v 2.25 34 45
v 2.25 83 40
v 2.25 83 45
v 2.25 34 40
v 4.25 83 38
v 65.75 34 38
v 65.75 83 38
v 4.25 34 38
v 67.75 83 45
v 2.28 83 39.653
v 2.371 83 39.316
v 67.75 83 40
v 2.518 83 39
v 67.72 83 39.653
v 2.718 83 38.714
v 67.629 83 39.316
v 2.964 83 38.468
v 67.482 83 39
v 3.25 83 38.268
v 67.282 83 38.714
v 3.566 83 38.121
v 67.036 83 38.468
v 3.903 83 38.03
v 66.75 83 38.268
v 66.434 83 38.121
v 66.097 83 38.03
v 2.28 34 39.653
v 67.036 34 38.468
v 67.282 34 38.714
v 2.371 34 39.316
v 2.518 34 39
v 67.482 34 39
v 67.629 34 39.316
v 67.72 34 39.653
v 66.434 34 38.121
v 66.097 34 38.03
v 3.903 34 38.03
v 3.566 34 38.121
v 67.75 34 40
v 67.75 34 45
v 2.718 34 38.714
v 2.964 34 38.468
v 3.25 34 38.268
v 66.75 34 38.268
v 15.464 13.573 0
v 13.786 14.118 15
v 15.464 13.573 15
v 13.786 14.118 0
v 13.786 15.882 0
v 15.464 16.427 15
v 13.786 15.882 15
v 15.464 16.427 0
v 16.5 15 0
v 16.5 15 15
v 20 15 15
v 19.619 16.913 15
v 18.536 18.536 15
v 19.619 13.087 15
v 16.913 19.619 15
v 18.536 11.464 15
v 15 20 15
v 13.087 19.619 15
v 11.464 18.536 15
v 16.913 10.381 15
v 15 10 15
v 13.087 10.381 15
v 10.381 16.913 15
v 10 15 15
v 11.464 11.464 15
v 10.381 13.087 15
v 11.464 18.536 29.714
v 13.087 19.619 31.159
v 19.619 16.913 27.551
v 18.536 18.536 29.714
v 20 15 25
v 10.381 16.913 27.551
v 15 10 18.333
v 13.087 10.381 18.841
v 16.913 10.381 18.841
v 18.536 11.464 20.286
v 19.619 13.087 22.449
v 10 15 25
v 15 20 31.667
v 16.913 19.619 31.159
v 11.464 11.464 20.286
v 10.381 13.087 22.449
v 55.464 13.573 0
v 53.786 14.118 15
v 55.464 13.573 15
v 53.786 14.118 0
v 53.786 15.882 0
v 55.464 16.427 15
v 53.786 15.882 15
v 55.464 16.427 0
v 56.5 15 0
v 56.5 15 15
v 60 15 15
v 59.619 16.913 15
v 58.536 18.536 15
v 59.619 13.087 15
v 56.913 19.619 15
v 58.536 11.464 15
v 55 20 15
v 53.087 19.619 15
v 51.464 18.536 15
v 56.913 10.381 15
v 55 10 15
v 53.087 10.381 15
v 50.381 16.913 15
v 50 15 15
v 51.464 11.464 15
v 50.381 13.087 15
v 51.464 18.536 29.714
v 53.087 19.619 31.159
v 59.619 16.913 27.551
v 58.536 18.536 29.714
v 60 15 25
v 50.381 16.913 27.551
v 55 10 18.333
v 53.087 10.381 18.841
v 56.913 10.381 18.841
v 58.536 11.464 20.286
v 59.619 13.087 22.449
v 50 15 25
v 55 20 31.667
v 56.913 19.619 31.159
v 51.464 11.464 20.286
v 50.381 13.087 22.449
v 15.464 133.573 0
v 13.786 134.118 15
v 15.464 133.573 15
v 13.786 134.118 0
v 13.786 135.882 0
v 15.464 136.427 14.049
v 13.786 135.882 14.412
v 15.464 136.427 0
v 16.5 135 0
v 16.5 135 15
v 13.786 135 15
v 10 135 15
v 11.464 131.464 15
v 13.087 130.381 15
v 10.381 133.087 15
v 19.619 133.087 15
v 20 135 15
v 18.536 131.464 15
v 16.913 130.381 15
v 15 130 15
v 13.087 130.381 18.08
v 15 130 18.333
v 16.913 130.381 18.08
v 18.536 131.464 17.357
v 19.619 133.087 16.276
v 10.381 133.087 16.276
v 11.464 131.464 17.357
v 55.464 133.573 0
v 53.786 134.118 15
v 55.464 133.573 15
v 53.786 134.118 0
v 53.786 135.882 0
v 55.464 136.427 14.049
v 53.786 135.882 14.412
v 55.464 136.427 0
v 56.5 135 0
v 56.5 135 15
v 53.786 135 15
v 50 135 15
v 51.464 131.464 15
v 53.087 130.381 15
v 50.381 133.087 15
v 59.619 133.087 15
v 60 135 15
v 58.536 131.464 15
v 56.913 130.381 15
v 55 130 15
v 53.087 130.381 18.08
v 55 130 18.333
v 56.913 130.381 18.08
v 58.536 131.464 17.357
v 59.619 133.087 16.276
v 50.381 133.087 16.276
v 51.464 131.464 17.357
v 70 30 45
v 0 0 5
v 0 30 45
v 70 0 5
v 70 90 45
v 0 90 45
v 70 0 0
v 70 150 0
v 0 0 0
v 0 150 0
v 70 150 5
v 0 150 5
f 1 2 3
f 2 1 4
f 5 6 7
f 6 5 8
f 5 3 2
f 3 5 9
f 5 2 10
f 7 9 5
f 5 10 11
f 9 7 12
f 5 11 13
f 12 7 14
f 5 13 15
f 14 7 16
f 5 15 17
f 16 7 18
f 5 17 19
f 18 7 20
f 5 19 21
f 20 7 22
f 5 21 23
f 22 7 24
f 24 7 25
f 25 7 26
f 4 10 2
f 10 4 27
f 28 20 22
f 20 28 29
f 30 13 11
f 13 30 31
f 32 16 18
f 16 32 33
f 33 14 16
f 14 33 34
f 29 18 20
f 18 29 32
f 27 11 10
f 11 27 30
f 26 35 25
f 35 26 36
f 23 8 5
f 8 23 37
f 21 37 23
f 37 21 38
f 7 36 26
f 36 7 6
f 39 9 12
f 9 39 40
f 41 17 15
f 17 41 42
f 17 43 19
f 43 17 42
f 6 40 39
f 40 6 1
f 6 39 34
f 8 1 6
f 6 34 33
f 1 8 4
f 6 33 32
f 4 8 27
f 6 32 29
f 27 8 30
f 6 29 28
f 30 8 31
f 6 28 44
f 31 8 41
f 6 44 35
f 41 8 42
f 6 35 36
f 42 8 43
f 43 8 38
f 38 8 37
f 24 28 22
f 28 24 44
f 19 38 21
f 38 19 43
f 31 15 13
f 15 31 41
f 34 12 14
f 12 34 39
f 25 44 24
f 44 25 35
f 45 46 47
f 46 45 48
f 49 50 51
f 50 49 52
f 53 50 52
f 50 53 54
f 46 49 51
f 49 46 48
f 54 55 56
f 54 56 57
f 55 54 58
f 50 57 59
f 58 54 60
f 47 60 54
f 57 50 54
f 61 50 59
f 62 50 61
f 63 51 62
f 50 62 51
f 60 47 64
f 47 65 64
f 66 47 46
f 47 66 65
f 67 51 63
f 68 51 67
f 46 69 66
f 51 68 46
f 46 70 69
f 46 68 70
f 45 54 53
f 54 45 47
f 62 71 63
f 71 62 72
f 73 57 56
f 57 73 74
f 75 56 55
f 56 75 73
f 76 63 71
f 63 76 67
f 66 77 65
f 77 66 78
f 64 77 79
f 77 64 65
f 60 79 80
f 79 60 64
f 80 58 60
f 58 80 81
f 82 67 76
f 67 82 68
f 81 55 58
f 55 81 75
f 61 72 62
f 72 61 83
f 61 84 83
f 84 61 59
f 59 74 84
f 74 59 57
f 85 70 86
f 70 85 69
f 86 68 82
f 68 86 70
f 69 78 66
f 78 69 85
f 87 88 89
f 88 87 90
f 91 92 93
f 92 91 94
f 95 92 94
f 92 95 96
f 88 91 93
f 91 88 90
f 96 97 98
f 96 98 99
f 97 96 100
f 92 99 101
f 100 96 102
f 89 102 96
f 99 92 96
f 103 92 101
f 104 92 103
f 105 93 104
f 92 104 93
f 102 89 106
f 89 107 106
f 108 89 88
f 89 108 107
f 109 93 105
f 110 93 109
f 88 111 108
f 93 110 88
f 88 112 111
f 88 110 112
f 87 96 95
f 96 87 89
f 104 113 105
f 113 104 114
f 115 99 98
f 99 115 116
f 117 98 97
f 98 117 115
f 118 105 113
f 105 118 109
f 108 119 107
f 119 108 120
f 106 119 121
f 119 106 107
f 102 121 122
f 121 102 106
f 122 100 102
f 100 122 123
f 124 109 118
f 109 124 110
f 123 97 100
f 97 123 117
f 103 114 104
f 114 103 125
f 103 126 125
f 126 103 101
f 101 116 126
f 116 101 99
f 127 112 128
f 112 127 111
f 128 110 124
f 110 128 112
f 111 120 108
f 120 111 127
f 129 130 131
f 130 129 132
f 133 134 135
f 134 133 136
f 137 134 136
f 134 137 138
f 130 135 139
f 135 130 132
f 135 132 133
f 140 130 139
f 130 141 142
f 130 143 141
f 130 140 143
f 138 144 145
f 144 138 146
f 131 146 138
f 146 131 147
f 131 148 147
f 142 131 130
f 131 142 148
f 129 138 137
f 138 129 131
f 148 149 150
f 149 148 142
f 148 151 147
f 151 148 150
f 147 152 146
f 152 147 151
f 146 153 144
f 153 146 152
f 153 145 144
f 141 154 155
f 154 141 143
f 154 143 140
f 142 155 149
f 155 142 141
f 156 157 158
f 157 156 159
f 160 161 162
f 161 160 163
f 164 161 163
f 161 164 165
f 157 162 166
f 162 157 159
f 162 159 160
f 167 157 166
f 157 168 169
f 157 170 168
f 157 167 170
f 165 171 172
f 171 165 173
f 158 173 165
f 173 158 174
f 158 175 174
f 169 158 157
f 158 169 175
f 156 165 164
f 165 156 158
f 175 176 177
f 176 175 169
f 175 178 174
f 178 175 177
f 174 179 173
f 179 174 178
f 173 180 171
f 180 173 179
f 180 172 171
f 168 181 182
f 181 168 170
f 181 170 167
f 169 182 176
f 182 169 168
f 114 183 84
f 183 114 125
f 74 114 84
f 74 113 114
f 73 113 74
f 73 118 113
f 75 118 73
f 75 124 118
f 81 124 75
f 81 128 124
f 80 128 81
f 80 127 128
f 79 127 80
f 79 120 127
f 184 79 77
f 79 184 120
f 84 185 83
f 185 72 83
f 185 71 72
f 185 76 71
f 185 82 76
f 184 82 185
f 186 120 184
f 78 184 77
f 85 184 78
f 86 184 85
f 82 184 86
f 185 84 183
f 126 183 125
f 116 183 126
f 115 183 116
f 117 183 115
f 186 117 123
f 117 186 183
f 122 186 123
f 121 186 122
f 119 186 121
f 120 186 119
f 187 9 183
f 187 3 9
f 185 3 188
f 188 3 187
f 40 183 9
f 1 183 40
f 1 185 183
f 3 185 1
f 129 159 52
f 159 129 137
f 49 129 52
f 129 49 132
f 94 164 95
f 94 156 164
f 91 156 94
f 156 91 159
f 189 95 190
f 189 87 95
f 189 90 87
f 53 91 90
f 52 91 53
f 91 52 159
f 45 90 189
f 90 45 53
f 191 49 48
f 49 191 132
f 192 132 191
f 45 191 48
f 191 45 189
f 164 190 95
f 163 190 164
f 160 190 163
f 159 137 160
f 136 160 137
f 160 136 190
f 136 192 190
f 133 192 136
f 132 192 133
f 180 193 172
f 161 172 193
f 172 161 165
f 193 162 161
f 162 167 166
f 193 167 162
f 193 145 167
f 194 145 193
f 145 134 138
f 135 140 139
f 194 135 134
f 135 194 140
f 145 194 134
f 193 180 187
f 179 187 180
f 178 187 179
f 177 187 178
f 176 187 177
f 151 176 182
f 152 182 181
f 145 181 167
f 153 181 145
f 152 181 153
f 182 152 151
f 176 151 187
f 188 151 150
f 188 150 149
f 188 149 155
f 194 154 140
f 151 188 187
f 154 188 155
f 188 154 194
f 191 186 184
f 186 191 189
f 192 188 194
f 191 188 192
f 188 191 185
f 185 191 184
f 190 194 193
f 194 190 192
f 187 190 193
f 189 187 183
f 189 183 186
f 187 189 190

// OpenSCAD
fn=36;

block_w = 70;
block_l = 150;
block_top_l = 60;
block_h = 40;
holder_offset = 30;

base_w = 63.5;
base_h = 19;
base_l = 50; 
base_top_w = 58;
bevel = 2;

cutout_h=10;
cutout_w=50;
cutout_l=base_l+2;
cutout_w_t = 43;


dremel_holder();

module dremel_holder(){
    screw_x = 15;
    screw_y = 15;
    
    difference(){
        block();
        translate([(block_w+bevel-base_w)/2,holder_offset+5,block_h])
            carrage(base_l);
        translate([screw_x,screw_y,15])
            screw_hole();
        translate([block_w-screw_x,screw_y,15])
            screw_hole();
        translate([screw_x,block_l-screw_y,15])
            screw_hole();
        translate([block_w-screw_x,block_l-screw_y,15])
            screw_hole();
    }

}

module block() {


    hull() {
        cube([block_w,block_l,5]);
        translate([0,holder_offset,block_h])
            cube([block_w,block_top_l,cutout_h/2]);
    }
}

module carrage(base_l) {
    cutout_h = 10;
    cutout_x = 7;

    difference() {
        base();
        translate([cutout_x,-2,cutout_h])
            base_cutout(base_l);
    }
}

module base() {

    translate([0,0,0])
        minkowski(){
            cube([base_w-bevel,base_l-bevel,base_h-1]);
            rotate([90,0,0]) 
                cylinder(r=bevel,h=1,$fn=fn);
        }
}

module base_cutout(base_l=50) {
    hull() {
        cube([cutout_w,cutout_l,0.1]);
        cube([cutout_w_t,cutout_l,cutout_h+0.1]);
    }
 }
 
 module screw_hole(shaft_r=1.5,channel_r=5,channel_h=50) {
    
    translate([0,0,-channel_h/2])
        cylinder(r=shaft_r,h=channel_h,center=true);
    translate([0,0,channel_h/2])
    cylinder(r=channel_r,h=channel_h,center=true);
     
     }
